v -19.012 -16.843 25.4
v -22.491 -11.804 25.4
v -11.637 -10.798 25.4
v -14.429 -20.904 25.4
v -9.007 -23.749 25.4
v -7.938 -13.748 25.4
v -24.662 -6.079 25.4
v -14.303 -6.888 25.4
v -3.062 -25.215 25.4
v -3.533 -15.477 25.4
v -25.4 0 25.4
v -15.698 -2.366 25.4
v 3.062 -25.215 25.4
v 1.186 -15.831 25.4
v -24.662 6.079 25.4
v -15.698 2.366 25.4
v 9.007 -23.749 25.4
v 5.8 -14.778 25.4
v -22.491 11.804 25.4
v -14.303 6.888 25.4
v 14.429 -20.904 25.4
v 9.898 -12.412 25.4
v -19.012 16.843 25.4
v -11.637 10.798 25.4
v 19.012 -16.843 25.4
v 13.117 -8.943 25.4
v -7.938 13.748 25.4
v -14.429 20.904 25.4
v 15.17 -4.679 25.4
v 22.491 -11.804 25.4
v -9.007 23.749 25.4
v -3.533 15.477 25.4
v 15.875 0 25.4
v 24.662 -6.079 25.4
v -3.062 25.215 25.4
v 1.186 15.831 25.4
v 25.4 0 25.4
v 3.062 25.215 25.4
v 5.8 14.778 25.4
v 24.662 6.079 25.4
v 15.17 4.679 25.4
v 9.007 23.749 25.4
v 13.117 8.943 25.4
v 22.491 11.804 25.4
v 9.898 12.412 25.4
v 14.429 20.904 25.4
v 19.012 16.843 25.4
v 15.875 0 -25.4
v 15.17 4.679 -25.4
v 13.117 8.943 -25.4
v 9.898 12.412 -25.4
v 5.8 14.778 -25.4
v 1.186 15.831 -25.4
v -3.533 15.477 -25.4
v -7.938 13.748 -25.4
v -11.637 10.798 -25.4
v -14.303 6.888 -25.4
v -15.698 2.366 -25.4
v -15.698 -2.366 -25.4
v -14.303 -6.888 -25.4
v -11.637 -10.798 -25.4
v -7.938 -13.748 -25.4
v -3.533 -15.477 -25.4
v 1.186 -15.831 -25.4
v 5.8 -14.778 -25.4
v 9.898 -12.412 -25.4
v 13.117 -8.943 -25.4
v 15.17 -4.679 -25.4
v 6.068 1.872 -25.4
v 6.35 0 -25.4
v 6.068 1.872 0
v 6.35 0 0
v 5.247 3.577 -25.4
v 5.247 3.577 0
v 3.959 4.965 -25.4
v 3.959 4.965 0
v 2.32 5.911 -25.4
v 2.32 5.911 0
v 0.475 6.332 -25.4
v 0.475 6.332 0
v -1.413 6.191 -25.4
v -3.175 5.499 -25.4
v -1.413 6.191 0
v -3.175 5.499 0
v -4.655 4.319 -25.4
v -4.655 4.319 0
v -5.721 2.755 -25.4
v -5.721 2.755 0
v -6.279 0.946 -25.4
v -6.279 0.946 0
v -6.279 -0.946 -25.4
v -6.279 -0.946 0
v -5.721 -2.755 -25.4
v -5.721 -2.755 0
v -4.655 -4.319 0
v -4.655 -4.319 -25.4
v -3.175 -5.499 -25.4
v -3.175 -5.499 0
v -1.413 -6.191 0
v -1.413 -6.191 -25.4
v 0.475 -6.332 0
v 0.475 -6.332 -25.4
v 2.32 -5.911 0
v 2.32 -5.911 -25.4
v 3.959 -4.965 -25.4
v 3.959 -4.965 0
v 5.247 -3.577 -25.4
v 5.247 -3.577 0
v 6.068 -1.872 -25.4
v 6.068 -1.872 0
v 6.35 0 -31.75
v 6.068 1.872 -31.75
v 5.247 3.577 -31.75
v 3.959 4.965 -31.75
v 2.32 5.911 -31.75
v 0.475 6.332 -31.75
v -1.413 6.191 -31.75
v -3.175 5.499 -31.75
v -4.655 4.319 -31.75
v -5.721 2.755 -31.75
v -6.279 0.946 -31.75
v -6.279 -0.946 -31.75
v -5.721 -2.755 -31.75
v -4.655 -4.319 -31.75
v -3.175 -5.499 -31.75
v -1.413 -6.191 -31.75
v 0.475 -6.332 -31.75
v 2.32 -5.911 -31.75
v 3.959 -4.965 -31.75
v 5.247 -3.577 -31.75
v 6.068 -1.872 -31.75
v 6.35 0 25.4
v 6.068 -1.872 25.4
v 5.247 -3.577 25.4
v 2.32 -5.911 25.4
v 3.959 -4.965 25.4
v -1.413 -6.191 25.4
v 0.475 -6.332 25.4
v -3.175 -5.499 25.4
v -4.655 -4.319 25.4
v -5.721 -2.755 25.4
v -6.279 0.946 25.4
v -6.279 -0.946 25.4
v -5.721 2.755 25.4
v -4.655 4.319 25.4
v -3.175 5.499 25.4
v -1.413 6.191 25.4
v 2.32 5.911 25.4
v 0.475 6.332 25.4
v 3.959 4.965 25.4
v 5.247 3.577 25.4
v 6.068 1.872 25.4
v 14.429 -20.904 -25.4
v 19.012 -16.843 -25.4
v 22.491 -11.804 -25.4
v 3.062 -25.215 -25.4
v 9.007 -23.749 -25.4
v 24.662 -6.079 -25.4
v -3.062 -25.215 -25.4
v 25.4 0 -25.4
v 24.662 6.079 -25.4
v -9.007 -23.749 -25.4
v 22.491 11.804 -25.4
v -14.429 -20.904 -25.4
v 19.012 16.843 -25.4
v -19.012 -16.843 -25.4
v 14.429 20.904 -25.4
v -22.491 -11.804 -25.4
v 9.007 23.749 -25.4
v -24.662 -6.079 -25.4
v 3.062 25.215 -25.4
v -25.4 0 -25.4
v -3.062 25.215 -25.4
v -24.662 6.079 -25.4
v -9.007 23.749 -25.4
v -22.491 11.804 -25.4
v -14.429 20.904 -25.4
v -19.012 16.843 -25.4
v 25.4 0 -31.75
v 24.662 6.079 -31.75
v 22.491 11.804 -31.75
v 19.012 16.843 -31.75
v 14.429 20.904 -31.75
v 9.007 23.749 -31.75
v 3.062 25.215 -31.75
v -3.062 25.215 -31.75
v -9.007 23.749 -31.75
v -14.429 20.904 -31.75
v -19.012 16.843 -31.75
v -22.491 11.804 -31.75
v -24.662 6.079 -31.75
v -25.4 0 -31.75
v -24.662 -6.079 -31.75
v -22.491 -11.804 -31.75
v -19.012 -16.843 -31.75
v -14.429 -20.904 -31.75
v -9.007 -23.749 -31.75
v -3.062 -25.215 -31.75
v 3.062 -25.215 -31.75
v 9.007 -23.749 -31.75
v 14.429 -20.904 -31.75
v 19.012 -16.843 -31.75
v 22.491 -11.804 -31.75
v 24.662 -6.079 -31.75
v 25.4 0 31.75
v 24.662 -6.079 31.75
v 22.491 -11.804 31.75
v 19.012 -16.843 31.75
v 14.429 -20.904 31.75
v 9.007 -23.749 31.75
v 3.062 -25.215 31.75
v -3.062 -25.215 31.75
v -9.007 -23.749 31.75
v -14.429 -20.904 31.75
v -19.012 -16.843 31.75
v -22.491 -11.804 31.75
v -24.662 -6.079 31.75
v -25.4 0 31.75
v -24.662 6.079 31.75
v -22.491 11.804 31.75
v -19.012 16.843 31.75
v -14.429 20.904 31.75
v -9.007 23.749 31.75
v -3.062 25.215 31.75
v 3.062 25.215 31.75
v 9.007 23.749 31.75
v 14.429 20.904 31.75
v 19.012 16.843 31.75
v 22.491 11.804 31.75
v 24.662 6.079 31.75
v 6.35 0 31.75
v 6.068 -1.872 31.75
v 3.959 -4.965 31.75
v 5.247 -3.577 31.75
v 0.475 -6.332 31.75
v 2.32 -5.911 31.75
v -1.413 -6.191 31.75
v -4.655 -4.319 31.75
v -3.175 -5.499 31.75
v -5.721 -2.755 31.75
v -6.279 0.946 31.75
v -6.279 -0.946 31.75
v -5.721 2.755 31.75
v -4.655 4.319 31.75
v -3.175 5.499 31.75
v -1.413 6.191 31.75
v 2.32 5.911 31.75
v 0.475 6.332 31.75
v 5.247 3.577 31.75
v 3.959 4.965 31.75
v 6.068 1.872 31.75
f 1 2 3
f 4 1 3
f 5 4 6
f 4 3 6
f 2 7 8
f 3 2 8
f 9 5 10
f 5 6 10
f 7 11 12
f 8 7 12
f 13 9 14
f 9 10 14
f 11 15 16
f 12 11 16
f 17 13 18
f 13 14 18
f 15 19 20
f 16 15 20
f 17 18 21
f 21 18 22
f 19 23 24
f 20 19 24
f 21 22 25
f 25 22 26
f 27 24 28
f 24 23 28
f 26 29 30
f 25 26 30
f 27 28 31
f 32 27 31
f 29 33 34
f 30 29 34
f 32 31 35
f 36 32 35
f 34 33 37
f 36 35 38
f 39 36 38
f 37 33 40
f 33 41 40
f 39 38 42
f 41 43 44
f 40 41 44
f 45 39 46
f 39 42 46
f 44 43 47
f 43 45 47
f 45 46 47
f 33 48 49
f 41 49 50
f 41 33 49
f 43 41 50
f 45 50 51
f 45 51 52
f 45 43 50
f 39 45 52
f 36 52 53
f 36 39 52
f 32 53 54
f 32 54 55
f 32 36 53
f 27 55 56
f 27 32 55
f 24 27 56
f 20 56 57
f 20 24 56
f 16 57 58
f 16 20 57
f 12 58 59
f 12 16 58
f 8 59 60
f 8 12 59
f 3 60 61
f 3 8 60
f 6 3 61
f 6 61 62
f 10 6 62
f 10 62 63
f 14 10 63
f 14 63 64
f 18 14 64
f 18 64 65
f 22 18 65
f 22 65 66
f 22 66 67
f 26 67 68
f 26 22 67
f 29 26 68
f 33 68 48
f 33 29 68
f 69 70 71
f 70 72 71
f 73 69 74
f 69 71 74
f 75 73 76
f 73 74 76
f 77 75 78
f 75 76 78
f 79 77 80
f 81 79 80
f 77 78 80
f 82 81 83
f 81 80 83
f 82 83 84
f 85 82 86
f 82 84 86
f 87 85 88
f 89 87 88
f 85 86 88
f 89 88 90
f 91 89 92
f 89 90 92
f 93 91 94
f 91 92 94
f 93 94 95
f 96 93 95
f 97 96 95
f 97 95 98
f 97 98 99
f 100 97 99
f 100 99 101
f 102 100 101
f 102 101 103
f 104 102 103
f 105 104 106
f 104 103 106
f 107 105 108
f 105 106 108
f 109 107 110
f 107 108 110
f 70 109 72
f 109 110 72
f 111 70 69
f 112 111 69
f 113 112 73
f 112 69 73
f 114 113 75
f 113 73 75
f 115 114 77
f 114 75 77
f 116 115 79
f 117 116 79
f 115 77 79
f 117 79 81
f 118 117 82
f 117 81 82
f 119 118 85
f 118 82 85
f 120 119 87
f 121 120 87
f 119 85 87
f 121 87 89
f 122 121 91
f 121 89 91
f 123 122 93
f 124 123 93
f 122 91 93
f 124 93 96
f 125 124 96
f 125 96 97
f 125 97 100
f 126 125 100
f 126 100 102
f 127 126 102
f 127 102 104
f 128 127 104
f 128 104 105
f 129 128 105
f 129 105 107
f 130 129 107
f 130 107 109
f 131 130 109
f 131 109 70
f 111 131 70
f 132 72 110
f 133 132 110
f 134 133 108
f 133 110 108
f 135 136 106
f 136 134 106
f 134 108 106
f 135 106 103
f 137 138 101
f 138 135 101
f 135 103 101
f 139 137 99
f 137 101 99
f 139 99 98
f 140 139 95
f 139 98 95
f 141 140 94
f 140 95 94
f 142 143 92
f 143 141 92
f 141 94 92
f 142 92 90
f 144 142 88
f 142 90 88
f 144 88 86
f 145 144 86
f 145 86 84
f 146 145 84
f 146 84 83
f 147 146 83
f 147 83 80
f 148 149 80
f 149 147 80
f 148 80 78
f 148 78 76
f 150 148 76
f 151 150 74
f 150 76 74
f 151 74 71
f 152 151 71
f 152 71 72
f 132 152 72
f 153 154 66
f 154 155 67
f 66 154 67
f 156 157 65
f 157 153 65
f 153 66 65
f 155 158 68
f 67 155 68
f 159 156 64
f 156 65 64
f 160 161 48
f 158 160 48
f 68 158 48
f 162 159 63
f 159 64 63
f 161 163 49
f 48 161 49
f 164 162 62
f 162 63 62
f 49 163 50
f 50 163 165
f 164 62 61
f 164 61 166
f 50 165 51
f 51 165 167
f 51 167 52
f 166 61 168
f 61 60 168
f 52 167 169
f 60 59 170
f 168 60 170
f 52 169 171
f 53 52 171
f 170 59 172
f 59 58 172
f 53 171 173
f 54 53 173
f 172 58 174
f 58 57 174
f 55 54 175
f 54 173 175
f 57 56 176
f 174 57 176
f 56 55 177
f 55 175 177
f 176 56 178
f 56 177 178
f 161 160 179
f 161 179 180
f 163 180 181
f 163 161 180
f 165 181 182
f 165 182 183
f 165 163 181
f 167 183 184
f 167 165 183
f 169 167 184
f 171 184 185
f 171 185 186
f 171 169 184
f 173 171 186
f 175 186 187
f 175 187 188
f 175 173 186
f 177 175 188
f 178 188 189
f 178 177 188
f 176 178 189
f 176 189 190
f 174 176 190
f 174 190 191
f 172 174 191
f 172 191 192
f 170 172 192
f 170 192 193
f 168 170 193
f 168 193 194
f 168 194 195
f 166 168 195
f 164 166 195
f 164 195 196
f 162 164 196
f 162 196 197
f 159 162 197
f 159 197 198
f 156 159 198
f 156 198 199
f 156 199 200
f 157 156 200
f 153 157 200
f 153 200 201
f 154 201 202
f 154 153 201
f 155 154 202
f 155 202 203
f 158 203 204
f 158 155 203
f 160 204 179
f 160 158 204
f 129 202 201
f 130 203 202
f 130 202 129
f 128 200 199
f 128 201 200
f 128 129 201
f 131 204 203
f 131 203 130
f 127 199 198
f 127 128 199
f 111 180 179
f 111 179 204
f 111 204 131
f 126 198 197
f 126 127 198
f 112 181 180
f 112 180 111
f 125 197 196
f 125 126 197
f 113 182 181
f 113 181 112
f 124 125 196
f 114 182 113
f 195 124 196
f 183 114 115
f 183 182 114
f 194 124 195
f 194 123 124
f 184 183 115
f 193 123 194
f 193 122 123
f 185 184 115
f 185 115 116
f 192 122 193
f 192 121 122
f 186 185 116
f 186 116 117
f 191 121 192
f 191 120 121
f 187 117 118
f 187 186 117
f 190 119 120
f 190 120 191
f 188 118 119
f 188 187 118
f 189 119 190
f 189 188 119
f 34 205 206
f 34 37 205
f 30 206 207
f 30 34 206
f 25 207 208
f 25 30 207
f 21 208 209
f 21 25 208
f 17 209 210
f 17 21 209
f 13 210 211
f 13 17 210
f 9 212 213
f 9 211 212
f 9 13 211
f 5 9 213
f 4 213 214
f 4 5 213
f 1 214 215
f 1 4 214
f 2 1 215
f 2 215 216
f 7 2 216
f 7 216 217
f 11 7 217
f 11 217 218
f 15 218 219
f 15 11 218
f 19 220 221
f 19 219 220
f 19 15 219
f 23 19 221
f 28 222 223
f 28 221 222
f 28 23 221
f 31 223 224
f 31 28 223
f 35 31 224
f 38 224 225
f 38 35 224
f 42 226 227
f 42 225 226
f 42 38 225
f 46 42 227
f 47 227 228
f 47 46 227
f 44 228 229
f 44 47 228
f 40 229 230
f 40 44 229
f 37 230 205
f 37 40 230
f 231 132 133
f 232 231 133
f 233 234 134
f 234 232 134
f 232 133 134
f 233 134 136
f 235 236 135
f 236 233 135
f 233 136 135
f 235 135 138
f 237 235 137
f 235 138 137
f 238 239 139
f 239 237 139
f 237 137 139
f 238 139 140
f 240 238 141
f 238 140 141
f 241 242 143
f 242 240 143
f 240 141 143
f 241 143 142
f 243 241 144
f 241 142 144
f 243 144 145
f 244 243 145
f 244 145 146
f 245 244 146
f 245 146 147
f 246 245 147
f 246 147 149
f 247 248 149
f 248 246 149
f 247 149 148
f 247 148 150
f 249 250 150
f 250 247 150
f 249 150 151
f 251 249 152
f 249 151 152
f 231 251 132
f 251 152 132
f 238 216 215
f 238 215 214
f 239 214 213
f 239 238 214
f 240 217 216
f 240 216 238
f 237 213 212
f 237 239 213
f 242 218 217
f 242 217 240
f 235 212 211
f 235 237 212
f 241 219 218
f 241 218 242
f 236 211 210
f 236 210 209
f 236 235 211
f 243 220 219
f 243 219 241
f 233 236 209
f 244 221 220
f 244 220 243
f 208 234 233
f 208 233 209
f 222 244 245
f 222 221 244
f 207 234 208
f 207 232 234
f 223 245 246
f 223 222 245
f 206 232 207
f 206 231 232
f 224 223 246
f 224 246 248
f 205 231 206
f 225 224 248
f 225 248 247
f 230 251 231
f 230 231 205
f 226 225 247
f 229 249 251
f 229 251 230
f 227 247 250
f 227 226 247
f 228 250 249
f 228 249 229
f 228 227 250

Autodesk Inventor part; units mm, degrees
ref_plane "YZ Plane" through (0, 0, 0) normal (1, 0, 0) x (0, 1, 0)
ref_plane "XZ Plane" through (0, 0, 0) normal (0, 1, 0) x (-1, 0, 0)
ref_plane "XY Plane" through (0, 0, 0) normal (0, 0, 1) x (1, 0, 0)
sketch "Sketch1" plane through (0, 0, 0) normal (0, 0, 1) x (1, 0, 0)
  circle A0 centre (0, 0) radius 15.875
  circle A1 centre (0, 0) radius 6.35
  dimension "d0" = 31.75
  dimension "d1" = 12.7
extrude "Extrusion1" add sketch "Sketch1" along normal mid plane 50.8
sketch "Sketch2" plane through (0, 0, 25.4) normal (0, 0, 1) x (1, 0, 0)
  circle A0 centre (0, 0) radius 6.35
  circle A1 centre (0, 0) radius 25.4
  dimension "d4" = 50.8
  dimension "d7" = 12.7
extrude "Extrusion2" add sketch "Sketch2" along normal blind 6.35
mirror "Mirror1" about plane through (0, 0, 0) normal (0, 0, 1) of "Extrusion2"
properties part number "lift Hub"
